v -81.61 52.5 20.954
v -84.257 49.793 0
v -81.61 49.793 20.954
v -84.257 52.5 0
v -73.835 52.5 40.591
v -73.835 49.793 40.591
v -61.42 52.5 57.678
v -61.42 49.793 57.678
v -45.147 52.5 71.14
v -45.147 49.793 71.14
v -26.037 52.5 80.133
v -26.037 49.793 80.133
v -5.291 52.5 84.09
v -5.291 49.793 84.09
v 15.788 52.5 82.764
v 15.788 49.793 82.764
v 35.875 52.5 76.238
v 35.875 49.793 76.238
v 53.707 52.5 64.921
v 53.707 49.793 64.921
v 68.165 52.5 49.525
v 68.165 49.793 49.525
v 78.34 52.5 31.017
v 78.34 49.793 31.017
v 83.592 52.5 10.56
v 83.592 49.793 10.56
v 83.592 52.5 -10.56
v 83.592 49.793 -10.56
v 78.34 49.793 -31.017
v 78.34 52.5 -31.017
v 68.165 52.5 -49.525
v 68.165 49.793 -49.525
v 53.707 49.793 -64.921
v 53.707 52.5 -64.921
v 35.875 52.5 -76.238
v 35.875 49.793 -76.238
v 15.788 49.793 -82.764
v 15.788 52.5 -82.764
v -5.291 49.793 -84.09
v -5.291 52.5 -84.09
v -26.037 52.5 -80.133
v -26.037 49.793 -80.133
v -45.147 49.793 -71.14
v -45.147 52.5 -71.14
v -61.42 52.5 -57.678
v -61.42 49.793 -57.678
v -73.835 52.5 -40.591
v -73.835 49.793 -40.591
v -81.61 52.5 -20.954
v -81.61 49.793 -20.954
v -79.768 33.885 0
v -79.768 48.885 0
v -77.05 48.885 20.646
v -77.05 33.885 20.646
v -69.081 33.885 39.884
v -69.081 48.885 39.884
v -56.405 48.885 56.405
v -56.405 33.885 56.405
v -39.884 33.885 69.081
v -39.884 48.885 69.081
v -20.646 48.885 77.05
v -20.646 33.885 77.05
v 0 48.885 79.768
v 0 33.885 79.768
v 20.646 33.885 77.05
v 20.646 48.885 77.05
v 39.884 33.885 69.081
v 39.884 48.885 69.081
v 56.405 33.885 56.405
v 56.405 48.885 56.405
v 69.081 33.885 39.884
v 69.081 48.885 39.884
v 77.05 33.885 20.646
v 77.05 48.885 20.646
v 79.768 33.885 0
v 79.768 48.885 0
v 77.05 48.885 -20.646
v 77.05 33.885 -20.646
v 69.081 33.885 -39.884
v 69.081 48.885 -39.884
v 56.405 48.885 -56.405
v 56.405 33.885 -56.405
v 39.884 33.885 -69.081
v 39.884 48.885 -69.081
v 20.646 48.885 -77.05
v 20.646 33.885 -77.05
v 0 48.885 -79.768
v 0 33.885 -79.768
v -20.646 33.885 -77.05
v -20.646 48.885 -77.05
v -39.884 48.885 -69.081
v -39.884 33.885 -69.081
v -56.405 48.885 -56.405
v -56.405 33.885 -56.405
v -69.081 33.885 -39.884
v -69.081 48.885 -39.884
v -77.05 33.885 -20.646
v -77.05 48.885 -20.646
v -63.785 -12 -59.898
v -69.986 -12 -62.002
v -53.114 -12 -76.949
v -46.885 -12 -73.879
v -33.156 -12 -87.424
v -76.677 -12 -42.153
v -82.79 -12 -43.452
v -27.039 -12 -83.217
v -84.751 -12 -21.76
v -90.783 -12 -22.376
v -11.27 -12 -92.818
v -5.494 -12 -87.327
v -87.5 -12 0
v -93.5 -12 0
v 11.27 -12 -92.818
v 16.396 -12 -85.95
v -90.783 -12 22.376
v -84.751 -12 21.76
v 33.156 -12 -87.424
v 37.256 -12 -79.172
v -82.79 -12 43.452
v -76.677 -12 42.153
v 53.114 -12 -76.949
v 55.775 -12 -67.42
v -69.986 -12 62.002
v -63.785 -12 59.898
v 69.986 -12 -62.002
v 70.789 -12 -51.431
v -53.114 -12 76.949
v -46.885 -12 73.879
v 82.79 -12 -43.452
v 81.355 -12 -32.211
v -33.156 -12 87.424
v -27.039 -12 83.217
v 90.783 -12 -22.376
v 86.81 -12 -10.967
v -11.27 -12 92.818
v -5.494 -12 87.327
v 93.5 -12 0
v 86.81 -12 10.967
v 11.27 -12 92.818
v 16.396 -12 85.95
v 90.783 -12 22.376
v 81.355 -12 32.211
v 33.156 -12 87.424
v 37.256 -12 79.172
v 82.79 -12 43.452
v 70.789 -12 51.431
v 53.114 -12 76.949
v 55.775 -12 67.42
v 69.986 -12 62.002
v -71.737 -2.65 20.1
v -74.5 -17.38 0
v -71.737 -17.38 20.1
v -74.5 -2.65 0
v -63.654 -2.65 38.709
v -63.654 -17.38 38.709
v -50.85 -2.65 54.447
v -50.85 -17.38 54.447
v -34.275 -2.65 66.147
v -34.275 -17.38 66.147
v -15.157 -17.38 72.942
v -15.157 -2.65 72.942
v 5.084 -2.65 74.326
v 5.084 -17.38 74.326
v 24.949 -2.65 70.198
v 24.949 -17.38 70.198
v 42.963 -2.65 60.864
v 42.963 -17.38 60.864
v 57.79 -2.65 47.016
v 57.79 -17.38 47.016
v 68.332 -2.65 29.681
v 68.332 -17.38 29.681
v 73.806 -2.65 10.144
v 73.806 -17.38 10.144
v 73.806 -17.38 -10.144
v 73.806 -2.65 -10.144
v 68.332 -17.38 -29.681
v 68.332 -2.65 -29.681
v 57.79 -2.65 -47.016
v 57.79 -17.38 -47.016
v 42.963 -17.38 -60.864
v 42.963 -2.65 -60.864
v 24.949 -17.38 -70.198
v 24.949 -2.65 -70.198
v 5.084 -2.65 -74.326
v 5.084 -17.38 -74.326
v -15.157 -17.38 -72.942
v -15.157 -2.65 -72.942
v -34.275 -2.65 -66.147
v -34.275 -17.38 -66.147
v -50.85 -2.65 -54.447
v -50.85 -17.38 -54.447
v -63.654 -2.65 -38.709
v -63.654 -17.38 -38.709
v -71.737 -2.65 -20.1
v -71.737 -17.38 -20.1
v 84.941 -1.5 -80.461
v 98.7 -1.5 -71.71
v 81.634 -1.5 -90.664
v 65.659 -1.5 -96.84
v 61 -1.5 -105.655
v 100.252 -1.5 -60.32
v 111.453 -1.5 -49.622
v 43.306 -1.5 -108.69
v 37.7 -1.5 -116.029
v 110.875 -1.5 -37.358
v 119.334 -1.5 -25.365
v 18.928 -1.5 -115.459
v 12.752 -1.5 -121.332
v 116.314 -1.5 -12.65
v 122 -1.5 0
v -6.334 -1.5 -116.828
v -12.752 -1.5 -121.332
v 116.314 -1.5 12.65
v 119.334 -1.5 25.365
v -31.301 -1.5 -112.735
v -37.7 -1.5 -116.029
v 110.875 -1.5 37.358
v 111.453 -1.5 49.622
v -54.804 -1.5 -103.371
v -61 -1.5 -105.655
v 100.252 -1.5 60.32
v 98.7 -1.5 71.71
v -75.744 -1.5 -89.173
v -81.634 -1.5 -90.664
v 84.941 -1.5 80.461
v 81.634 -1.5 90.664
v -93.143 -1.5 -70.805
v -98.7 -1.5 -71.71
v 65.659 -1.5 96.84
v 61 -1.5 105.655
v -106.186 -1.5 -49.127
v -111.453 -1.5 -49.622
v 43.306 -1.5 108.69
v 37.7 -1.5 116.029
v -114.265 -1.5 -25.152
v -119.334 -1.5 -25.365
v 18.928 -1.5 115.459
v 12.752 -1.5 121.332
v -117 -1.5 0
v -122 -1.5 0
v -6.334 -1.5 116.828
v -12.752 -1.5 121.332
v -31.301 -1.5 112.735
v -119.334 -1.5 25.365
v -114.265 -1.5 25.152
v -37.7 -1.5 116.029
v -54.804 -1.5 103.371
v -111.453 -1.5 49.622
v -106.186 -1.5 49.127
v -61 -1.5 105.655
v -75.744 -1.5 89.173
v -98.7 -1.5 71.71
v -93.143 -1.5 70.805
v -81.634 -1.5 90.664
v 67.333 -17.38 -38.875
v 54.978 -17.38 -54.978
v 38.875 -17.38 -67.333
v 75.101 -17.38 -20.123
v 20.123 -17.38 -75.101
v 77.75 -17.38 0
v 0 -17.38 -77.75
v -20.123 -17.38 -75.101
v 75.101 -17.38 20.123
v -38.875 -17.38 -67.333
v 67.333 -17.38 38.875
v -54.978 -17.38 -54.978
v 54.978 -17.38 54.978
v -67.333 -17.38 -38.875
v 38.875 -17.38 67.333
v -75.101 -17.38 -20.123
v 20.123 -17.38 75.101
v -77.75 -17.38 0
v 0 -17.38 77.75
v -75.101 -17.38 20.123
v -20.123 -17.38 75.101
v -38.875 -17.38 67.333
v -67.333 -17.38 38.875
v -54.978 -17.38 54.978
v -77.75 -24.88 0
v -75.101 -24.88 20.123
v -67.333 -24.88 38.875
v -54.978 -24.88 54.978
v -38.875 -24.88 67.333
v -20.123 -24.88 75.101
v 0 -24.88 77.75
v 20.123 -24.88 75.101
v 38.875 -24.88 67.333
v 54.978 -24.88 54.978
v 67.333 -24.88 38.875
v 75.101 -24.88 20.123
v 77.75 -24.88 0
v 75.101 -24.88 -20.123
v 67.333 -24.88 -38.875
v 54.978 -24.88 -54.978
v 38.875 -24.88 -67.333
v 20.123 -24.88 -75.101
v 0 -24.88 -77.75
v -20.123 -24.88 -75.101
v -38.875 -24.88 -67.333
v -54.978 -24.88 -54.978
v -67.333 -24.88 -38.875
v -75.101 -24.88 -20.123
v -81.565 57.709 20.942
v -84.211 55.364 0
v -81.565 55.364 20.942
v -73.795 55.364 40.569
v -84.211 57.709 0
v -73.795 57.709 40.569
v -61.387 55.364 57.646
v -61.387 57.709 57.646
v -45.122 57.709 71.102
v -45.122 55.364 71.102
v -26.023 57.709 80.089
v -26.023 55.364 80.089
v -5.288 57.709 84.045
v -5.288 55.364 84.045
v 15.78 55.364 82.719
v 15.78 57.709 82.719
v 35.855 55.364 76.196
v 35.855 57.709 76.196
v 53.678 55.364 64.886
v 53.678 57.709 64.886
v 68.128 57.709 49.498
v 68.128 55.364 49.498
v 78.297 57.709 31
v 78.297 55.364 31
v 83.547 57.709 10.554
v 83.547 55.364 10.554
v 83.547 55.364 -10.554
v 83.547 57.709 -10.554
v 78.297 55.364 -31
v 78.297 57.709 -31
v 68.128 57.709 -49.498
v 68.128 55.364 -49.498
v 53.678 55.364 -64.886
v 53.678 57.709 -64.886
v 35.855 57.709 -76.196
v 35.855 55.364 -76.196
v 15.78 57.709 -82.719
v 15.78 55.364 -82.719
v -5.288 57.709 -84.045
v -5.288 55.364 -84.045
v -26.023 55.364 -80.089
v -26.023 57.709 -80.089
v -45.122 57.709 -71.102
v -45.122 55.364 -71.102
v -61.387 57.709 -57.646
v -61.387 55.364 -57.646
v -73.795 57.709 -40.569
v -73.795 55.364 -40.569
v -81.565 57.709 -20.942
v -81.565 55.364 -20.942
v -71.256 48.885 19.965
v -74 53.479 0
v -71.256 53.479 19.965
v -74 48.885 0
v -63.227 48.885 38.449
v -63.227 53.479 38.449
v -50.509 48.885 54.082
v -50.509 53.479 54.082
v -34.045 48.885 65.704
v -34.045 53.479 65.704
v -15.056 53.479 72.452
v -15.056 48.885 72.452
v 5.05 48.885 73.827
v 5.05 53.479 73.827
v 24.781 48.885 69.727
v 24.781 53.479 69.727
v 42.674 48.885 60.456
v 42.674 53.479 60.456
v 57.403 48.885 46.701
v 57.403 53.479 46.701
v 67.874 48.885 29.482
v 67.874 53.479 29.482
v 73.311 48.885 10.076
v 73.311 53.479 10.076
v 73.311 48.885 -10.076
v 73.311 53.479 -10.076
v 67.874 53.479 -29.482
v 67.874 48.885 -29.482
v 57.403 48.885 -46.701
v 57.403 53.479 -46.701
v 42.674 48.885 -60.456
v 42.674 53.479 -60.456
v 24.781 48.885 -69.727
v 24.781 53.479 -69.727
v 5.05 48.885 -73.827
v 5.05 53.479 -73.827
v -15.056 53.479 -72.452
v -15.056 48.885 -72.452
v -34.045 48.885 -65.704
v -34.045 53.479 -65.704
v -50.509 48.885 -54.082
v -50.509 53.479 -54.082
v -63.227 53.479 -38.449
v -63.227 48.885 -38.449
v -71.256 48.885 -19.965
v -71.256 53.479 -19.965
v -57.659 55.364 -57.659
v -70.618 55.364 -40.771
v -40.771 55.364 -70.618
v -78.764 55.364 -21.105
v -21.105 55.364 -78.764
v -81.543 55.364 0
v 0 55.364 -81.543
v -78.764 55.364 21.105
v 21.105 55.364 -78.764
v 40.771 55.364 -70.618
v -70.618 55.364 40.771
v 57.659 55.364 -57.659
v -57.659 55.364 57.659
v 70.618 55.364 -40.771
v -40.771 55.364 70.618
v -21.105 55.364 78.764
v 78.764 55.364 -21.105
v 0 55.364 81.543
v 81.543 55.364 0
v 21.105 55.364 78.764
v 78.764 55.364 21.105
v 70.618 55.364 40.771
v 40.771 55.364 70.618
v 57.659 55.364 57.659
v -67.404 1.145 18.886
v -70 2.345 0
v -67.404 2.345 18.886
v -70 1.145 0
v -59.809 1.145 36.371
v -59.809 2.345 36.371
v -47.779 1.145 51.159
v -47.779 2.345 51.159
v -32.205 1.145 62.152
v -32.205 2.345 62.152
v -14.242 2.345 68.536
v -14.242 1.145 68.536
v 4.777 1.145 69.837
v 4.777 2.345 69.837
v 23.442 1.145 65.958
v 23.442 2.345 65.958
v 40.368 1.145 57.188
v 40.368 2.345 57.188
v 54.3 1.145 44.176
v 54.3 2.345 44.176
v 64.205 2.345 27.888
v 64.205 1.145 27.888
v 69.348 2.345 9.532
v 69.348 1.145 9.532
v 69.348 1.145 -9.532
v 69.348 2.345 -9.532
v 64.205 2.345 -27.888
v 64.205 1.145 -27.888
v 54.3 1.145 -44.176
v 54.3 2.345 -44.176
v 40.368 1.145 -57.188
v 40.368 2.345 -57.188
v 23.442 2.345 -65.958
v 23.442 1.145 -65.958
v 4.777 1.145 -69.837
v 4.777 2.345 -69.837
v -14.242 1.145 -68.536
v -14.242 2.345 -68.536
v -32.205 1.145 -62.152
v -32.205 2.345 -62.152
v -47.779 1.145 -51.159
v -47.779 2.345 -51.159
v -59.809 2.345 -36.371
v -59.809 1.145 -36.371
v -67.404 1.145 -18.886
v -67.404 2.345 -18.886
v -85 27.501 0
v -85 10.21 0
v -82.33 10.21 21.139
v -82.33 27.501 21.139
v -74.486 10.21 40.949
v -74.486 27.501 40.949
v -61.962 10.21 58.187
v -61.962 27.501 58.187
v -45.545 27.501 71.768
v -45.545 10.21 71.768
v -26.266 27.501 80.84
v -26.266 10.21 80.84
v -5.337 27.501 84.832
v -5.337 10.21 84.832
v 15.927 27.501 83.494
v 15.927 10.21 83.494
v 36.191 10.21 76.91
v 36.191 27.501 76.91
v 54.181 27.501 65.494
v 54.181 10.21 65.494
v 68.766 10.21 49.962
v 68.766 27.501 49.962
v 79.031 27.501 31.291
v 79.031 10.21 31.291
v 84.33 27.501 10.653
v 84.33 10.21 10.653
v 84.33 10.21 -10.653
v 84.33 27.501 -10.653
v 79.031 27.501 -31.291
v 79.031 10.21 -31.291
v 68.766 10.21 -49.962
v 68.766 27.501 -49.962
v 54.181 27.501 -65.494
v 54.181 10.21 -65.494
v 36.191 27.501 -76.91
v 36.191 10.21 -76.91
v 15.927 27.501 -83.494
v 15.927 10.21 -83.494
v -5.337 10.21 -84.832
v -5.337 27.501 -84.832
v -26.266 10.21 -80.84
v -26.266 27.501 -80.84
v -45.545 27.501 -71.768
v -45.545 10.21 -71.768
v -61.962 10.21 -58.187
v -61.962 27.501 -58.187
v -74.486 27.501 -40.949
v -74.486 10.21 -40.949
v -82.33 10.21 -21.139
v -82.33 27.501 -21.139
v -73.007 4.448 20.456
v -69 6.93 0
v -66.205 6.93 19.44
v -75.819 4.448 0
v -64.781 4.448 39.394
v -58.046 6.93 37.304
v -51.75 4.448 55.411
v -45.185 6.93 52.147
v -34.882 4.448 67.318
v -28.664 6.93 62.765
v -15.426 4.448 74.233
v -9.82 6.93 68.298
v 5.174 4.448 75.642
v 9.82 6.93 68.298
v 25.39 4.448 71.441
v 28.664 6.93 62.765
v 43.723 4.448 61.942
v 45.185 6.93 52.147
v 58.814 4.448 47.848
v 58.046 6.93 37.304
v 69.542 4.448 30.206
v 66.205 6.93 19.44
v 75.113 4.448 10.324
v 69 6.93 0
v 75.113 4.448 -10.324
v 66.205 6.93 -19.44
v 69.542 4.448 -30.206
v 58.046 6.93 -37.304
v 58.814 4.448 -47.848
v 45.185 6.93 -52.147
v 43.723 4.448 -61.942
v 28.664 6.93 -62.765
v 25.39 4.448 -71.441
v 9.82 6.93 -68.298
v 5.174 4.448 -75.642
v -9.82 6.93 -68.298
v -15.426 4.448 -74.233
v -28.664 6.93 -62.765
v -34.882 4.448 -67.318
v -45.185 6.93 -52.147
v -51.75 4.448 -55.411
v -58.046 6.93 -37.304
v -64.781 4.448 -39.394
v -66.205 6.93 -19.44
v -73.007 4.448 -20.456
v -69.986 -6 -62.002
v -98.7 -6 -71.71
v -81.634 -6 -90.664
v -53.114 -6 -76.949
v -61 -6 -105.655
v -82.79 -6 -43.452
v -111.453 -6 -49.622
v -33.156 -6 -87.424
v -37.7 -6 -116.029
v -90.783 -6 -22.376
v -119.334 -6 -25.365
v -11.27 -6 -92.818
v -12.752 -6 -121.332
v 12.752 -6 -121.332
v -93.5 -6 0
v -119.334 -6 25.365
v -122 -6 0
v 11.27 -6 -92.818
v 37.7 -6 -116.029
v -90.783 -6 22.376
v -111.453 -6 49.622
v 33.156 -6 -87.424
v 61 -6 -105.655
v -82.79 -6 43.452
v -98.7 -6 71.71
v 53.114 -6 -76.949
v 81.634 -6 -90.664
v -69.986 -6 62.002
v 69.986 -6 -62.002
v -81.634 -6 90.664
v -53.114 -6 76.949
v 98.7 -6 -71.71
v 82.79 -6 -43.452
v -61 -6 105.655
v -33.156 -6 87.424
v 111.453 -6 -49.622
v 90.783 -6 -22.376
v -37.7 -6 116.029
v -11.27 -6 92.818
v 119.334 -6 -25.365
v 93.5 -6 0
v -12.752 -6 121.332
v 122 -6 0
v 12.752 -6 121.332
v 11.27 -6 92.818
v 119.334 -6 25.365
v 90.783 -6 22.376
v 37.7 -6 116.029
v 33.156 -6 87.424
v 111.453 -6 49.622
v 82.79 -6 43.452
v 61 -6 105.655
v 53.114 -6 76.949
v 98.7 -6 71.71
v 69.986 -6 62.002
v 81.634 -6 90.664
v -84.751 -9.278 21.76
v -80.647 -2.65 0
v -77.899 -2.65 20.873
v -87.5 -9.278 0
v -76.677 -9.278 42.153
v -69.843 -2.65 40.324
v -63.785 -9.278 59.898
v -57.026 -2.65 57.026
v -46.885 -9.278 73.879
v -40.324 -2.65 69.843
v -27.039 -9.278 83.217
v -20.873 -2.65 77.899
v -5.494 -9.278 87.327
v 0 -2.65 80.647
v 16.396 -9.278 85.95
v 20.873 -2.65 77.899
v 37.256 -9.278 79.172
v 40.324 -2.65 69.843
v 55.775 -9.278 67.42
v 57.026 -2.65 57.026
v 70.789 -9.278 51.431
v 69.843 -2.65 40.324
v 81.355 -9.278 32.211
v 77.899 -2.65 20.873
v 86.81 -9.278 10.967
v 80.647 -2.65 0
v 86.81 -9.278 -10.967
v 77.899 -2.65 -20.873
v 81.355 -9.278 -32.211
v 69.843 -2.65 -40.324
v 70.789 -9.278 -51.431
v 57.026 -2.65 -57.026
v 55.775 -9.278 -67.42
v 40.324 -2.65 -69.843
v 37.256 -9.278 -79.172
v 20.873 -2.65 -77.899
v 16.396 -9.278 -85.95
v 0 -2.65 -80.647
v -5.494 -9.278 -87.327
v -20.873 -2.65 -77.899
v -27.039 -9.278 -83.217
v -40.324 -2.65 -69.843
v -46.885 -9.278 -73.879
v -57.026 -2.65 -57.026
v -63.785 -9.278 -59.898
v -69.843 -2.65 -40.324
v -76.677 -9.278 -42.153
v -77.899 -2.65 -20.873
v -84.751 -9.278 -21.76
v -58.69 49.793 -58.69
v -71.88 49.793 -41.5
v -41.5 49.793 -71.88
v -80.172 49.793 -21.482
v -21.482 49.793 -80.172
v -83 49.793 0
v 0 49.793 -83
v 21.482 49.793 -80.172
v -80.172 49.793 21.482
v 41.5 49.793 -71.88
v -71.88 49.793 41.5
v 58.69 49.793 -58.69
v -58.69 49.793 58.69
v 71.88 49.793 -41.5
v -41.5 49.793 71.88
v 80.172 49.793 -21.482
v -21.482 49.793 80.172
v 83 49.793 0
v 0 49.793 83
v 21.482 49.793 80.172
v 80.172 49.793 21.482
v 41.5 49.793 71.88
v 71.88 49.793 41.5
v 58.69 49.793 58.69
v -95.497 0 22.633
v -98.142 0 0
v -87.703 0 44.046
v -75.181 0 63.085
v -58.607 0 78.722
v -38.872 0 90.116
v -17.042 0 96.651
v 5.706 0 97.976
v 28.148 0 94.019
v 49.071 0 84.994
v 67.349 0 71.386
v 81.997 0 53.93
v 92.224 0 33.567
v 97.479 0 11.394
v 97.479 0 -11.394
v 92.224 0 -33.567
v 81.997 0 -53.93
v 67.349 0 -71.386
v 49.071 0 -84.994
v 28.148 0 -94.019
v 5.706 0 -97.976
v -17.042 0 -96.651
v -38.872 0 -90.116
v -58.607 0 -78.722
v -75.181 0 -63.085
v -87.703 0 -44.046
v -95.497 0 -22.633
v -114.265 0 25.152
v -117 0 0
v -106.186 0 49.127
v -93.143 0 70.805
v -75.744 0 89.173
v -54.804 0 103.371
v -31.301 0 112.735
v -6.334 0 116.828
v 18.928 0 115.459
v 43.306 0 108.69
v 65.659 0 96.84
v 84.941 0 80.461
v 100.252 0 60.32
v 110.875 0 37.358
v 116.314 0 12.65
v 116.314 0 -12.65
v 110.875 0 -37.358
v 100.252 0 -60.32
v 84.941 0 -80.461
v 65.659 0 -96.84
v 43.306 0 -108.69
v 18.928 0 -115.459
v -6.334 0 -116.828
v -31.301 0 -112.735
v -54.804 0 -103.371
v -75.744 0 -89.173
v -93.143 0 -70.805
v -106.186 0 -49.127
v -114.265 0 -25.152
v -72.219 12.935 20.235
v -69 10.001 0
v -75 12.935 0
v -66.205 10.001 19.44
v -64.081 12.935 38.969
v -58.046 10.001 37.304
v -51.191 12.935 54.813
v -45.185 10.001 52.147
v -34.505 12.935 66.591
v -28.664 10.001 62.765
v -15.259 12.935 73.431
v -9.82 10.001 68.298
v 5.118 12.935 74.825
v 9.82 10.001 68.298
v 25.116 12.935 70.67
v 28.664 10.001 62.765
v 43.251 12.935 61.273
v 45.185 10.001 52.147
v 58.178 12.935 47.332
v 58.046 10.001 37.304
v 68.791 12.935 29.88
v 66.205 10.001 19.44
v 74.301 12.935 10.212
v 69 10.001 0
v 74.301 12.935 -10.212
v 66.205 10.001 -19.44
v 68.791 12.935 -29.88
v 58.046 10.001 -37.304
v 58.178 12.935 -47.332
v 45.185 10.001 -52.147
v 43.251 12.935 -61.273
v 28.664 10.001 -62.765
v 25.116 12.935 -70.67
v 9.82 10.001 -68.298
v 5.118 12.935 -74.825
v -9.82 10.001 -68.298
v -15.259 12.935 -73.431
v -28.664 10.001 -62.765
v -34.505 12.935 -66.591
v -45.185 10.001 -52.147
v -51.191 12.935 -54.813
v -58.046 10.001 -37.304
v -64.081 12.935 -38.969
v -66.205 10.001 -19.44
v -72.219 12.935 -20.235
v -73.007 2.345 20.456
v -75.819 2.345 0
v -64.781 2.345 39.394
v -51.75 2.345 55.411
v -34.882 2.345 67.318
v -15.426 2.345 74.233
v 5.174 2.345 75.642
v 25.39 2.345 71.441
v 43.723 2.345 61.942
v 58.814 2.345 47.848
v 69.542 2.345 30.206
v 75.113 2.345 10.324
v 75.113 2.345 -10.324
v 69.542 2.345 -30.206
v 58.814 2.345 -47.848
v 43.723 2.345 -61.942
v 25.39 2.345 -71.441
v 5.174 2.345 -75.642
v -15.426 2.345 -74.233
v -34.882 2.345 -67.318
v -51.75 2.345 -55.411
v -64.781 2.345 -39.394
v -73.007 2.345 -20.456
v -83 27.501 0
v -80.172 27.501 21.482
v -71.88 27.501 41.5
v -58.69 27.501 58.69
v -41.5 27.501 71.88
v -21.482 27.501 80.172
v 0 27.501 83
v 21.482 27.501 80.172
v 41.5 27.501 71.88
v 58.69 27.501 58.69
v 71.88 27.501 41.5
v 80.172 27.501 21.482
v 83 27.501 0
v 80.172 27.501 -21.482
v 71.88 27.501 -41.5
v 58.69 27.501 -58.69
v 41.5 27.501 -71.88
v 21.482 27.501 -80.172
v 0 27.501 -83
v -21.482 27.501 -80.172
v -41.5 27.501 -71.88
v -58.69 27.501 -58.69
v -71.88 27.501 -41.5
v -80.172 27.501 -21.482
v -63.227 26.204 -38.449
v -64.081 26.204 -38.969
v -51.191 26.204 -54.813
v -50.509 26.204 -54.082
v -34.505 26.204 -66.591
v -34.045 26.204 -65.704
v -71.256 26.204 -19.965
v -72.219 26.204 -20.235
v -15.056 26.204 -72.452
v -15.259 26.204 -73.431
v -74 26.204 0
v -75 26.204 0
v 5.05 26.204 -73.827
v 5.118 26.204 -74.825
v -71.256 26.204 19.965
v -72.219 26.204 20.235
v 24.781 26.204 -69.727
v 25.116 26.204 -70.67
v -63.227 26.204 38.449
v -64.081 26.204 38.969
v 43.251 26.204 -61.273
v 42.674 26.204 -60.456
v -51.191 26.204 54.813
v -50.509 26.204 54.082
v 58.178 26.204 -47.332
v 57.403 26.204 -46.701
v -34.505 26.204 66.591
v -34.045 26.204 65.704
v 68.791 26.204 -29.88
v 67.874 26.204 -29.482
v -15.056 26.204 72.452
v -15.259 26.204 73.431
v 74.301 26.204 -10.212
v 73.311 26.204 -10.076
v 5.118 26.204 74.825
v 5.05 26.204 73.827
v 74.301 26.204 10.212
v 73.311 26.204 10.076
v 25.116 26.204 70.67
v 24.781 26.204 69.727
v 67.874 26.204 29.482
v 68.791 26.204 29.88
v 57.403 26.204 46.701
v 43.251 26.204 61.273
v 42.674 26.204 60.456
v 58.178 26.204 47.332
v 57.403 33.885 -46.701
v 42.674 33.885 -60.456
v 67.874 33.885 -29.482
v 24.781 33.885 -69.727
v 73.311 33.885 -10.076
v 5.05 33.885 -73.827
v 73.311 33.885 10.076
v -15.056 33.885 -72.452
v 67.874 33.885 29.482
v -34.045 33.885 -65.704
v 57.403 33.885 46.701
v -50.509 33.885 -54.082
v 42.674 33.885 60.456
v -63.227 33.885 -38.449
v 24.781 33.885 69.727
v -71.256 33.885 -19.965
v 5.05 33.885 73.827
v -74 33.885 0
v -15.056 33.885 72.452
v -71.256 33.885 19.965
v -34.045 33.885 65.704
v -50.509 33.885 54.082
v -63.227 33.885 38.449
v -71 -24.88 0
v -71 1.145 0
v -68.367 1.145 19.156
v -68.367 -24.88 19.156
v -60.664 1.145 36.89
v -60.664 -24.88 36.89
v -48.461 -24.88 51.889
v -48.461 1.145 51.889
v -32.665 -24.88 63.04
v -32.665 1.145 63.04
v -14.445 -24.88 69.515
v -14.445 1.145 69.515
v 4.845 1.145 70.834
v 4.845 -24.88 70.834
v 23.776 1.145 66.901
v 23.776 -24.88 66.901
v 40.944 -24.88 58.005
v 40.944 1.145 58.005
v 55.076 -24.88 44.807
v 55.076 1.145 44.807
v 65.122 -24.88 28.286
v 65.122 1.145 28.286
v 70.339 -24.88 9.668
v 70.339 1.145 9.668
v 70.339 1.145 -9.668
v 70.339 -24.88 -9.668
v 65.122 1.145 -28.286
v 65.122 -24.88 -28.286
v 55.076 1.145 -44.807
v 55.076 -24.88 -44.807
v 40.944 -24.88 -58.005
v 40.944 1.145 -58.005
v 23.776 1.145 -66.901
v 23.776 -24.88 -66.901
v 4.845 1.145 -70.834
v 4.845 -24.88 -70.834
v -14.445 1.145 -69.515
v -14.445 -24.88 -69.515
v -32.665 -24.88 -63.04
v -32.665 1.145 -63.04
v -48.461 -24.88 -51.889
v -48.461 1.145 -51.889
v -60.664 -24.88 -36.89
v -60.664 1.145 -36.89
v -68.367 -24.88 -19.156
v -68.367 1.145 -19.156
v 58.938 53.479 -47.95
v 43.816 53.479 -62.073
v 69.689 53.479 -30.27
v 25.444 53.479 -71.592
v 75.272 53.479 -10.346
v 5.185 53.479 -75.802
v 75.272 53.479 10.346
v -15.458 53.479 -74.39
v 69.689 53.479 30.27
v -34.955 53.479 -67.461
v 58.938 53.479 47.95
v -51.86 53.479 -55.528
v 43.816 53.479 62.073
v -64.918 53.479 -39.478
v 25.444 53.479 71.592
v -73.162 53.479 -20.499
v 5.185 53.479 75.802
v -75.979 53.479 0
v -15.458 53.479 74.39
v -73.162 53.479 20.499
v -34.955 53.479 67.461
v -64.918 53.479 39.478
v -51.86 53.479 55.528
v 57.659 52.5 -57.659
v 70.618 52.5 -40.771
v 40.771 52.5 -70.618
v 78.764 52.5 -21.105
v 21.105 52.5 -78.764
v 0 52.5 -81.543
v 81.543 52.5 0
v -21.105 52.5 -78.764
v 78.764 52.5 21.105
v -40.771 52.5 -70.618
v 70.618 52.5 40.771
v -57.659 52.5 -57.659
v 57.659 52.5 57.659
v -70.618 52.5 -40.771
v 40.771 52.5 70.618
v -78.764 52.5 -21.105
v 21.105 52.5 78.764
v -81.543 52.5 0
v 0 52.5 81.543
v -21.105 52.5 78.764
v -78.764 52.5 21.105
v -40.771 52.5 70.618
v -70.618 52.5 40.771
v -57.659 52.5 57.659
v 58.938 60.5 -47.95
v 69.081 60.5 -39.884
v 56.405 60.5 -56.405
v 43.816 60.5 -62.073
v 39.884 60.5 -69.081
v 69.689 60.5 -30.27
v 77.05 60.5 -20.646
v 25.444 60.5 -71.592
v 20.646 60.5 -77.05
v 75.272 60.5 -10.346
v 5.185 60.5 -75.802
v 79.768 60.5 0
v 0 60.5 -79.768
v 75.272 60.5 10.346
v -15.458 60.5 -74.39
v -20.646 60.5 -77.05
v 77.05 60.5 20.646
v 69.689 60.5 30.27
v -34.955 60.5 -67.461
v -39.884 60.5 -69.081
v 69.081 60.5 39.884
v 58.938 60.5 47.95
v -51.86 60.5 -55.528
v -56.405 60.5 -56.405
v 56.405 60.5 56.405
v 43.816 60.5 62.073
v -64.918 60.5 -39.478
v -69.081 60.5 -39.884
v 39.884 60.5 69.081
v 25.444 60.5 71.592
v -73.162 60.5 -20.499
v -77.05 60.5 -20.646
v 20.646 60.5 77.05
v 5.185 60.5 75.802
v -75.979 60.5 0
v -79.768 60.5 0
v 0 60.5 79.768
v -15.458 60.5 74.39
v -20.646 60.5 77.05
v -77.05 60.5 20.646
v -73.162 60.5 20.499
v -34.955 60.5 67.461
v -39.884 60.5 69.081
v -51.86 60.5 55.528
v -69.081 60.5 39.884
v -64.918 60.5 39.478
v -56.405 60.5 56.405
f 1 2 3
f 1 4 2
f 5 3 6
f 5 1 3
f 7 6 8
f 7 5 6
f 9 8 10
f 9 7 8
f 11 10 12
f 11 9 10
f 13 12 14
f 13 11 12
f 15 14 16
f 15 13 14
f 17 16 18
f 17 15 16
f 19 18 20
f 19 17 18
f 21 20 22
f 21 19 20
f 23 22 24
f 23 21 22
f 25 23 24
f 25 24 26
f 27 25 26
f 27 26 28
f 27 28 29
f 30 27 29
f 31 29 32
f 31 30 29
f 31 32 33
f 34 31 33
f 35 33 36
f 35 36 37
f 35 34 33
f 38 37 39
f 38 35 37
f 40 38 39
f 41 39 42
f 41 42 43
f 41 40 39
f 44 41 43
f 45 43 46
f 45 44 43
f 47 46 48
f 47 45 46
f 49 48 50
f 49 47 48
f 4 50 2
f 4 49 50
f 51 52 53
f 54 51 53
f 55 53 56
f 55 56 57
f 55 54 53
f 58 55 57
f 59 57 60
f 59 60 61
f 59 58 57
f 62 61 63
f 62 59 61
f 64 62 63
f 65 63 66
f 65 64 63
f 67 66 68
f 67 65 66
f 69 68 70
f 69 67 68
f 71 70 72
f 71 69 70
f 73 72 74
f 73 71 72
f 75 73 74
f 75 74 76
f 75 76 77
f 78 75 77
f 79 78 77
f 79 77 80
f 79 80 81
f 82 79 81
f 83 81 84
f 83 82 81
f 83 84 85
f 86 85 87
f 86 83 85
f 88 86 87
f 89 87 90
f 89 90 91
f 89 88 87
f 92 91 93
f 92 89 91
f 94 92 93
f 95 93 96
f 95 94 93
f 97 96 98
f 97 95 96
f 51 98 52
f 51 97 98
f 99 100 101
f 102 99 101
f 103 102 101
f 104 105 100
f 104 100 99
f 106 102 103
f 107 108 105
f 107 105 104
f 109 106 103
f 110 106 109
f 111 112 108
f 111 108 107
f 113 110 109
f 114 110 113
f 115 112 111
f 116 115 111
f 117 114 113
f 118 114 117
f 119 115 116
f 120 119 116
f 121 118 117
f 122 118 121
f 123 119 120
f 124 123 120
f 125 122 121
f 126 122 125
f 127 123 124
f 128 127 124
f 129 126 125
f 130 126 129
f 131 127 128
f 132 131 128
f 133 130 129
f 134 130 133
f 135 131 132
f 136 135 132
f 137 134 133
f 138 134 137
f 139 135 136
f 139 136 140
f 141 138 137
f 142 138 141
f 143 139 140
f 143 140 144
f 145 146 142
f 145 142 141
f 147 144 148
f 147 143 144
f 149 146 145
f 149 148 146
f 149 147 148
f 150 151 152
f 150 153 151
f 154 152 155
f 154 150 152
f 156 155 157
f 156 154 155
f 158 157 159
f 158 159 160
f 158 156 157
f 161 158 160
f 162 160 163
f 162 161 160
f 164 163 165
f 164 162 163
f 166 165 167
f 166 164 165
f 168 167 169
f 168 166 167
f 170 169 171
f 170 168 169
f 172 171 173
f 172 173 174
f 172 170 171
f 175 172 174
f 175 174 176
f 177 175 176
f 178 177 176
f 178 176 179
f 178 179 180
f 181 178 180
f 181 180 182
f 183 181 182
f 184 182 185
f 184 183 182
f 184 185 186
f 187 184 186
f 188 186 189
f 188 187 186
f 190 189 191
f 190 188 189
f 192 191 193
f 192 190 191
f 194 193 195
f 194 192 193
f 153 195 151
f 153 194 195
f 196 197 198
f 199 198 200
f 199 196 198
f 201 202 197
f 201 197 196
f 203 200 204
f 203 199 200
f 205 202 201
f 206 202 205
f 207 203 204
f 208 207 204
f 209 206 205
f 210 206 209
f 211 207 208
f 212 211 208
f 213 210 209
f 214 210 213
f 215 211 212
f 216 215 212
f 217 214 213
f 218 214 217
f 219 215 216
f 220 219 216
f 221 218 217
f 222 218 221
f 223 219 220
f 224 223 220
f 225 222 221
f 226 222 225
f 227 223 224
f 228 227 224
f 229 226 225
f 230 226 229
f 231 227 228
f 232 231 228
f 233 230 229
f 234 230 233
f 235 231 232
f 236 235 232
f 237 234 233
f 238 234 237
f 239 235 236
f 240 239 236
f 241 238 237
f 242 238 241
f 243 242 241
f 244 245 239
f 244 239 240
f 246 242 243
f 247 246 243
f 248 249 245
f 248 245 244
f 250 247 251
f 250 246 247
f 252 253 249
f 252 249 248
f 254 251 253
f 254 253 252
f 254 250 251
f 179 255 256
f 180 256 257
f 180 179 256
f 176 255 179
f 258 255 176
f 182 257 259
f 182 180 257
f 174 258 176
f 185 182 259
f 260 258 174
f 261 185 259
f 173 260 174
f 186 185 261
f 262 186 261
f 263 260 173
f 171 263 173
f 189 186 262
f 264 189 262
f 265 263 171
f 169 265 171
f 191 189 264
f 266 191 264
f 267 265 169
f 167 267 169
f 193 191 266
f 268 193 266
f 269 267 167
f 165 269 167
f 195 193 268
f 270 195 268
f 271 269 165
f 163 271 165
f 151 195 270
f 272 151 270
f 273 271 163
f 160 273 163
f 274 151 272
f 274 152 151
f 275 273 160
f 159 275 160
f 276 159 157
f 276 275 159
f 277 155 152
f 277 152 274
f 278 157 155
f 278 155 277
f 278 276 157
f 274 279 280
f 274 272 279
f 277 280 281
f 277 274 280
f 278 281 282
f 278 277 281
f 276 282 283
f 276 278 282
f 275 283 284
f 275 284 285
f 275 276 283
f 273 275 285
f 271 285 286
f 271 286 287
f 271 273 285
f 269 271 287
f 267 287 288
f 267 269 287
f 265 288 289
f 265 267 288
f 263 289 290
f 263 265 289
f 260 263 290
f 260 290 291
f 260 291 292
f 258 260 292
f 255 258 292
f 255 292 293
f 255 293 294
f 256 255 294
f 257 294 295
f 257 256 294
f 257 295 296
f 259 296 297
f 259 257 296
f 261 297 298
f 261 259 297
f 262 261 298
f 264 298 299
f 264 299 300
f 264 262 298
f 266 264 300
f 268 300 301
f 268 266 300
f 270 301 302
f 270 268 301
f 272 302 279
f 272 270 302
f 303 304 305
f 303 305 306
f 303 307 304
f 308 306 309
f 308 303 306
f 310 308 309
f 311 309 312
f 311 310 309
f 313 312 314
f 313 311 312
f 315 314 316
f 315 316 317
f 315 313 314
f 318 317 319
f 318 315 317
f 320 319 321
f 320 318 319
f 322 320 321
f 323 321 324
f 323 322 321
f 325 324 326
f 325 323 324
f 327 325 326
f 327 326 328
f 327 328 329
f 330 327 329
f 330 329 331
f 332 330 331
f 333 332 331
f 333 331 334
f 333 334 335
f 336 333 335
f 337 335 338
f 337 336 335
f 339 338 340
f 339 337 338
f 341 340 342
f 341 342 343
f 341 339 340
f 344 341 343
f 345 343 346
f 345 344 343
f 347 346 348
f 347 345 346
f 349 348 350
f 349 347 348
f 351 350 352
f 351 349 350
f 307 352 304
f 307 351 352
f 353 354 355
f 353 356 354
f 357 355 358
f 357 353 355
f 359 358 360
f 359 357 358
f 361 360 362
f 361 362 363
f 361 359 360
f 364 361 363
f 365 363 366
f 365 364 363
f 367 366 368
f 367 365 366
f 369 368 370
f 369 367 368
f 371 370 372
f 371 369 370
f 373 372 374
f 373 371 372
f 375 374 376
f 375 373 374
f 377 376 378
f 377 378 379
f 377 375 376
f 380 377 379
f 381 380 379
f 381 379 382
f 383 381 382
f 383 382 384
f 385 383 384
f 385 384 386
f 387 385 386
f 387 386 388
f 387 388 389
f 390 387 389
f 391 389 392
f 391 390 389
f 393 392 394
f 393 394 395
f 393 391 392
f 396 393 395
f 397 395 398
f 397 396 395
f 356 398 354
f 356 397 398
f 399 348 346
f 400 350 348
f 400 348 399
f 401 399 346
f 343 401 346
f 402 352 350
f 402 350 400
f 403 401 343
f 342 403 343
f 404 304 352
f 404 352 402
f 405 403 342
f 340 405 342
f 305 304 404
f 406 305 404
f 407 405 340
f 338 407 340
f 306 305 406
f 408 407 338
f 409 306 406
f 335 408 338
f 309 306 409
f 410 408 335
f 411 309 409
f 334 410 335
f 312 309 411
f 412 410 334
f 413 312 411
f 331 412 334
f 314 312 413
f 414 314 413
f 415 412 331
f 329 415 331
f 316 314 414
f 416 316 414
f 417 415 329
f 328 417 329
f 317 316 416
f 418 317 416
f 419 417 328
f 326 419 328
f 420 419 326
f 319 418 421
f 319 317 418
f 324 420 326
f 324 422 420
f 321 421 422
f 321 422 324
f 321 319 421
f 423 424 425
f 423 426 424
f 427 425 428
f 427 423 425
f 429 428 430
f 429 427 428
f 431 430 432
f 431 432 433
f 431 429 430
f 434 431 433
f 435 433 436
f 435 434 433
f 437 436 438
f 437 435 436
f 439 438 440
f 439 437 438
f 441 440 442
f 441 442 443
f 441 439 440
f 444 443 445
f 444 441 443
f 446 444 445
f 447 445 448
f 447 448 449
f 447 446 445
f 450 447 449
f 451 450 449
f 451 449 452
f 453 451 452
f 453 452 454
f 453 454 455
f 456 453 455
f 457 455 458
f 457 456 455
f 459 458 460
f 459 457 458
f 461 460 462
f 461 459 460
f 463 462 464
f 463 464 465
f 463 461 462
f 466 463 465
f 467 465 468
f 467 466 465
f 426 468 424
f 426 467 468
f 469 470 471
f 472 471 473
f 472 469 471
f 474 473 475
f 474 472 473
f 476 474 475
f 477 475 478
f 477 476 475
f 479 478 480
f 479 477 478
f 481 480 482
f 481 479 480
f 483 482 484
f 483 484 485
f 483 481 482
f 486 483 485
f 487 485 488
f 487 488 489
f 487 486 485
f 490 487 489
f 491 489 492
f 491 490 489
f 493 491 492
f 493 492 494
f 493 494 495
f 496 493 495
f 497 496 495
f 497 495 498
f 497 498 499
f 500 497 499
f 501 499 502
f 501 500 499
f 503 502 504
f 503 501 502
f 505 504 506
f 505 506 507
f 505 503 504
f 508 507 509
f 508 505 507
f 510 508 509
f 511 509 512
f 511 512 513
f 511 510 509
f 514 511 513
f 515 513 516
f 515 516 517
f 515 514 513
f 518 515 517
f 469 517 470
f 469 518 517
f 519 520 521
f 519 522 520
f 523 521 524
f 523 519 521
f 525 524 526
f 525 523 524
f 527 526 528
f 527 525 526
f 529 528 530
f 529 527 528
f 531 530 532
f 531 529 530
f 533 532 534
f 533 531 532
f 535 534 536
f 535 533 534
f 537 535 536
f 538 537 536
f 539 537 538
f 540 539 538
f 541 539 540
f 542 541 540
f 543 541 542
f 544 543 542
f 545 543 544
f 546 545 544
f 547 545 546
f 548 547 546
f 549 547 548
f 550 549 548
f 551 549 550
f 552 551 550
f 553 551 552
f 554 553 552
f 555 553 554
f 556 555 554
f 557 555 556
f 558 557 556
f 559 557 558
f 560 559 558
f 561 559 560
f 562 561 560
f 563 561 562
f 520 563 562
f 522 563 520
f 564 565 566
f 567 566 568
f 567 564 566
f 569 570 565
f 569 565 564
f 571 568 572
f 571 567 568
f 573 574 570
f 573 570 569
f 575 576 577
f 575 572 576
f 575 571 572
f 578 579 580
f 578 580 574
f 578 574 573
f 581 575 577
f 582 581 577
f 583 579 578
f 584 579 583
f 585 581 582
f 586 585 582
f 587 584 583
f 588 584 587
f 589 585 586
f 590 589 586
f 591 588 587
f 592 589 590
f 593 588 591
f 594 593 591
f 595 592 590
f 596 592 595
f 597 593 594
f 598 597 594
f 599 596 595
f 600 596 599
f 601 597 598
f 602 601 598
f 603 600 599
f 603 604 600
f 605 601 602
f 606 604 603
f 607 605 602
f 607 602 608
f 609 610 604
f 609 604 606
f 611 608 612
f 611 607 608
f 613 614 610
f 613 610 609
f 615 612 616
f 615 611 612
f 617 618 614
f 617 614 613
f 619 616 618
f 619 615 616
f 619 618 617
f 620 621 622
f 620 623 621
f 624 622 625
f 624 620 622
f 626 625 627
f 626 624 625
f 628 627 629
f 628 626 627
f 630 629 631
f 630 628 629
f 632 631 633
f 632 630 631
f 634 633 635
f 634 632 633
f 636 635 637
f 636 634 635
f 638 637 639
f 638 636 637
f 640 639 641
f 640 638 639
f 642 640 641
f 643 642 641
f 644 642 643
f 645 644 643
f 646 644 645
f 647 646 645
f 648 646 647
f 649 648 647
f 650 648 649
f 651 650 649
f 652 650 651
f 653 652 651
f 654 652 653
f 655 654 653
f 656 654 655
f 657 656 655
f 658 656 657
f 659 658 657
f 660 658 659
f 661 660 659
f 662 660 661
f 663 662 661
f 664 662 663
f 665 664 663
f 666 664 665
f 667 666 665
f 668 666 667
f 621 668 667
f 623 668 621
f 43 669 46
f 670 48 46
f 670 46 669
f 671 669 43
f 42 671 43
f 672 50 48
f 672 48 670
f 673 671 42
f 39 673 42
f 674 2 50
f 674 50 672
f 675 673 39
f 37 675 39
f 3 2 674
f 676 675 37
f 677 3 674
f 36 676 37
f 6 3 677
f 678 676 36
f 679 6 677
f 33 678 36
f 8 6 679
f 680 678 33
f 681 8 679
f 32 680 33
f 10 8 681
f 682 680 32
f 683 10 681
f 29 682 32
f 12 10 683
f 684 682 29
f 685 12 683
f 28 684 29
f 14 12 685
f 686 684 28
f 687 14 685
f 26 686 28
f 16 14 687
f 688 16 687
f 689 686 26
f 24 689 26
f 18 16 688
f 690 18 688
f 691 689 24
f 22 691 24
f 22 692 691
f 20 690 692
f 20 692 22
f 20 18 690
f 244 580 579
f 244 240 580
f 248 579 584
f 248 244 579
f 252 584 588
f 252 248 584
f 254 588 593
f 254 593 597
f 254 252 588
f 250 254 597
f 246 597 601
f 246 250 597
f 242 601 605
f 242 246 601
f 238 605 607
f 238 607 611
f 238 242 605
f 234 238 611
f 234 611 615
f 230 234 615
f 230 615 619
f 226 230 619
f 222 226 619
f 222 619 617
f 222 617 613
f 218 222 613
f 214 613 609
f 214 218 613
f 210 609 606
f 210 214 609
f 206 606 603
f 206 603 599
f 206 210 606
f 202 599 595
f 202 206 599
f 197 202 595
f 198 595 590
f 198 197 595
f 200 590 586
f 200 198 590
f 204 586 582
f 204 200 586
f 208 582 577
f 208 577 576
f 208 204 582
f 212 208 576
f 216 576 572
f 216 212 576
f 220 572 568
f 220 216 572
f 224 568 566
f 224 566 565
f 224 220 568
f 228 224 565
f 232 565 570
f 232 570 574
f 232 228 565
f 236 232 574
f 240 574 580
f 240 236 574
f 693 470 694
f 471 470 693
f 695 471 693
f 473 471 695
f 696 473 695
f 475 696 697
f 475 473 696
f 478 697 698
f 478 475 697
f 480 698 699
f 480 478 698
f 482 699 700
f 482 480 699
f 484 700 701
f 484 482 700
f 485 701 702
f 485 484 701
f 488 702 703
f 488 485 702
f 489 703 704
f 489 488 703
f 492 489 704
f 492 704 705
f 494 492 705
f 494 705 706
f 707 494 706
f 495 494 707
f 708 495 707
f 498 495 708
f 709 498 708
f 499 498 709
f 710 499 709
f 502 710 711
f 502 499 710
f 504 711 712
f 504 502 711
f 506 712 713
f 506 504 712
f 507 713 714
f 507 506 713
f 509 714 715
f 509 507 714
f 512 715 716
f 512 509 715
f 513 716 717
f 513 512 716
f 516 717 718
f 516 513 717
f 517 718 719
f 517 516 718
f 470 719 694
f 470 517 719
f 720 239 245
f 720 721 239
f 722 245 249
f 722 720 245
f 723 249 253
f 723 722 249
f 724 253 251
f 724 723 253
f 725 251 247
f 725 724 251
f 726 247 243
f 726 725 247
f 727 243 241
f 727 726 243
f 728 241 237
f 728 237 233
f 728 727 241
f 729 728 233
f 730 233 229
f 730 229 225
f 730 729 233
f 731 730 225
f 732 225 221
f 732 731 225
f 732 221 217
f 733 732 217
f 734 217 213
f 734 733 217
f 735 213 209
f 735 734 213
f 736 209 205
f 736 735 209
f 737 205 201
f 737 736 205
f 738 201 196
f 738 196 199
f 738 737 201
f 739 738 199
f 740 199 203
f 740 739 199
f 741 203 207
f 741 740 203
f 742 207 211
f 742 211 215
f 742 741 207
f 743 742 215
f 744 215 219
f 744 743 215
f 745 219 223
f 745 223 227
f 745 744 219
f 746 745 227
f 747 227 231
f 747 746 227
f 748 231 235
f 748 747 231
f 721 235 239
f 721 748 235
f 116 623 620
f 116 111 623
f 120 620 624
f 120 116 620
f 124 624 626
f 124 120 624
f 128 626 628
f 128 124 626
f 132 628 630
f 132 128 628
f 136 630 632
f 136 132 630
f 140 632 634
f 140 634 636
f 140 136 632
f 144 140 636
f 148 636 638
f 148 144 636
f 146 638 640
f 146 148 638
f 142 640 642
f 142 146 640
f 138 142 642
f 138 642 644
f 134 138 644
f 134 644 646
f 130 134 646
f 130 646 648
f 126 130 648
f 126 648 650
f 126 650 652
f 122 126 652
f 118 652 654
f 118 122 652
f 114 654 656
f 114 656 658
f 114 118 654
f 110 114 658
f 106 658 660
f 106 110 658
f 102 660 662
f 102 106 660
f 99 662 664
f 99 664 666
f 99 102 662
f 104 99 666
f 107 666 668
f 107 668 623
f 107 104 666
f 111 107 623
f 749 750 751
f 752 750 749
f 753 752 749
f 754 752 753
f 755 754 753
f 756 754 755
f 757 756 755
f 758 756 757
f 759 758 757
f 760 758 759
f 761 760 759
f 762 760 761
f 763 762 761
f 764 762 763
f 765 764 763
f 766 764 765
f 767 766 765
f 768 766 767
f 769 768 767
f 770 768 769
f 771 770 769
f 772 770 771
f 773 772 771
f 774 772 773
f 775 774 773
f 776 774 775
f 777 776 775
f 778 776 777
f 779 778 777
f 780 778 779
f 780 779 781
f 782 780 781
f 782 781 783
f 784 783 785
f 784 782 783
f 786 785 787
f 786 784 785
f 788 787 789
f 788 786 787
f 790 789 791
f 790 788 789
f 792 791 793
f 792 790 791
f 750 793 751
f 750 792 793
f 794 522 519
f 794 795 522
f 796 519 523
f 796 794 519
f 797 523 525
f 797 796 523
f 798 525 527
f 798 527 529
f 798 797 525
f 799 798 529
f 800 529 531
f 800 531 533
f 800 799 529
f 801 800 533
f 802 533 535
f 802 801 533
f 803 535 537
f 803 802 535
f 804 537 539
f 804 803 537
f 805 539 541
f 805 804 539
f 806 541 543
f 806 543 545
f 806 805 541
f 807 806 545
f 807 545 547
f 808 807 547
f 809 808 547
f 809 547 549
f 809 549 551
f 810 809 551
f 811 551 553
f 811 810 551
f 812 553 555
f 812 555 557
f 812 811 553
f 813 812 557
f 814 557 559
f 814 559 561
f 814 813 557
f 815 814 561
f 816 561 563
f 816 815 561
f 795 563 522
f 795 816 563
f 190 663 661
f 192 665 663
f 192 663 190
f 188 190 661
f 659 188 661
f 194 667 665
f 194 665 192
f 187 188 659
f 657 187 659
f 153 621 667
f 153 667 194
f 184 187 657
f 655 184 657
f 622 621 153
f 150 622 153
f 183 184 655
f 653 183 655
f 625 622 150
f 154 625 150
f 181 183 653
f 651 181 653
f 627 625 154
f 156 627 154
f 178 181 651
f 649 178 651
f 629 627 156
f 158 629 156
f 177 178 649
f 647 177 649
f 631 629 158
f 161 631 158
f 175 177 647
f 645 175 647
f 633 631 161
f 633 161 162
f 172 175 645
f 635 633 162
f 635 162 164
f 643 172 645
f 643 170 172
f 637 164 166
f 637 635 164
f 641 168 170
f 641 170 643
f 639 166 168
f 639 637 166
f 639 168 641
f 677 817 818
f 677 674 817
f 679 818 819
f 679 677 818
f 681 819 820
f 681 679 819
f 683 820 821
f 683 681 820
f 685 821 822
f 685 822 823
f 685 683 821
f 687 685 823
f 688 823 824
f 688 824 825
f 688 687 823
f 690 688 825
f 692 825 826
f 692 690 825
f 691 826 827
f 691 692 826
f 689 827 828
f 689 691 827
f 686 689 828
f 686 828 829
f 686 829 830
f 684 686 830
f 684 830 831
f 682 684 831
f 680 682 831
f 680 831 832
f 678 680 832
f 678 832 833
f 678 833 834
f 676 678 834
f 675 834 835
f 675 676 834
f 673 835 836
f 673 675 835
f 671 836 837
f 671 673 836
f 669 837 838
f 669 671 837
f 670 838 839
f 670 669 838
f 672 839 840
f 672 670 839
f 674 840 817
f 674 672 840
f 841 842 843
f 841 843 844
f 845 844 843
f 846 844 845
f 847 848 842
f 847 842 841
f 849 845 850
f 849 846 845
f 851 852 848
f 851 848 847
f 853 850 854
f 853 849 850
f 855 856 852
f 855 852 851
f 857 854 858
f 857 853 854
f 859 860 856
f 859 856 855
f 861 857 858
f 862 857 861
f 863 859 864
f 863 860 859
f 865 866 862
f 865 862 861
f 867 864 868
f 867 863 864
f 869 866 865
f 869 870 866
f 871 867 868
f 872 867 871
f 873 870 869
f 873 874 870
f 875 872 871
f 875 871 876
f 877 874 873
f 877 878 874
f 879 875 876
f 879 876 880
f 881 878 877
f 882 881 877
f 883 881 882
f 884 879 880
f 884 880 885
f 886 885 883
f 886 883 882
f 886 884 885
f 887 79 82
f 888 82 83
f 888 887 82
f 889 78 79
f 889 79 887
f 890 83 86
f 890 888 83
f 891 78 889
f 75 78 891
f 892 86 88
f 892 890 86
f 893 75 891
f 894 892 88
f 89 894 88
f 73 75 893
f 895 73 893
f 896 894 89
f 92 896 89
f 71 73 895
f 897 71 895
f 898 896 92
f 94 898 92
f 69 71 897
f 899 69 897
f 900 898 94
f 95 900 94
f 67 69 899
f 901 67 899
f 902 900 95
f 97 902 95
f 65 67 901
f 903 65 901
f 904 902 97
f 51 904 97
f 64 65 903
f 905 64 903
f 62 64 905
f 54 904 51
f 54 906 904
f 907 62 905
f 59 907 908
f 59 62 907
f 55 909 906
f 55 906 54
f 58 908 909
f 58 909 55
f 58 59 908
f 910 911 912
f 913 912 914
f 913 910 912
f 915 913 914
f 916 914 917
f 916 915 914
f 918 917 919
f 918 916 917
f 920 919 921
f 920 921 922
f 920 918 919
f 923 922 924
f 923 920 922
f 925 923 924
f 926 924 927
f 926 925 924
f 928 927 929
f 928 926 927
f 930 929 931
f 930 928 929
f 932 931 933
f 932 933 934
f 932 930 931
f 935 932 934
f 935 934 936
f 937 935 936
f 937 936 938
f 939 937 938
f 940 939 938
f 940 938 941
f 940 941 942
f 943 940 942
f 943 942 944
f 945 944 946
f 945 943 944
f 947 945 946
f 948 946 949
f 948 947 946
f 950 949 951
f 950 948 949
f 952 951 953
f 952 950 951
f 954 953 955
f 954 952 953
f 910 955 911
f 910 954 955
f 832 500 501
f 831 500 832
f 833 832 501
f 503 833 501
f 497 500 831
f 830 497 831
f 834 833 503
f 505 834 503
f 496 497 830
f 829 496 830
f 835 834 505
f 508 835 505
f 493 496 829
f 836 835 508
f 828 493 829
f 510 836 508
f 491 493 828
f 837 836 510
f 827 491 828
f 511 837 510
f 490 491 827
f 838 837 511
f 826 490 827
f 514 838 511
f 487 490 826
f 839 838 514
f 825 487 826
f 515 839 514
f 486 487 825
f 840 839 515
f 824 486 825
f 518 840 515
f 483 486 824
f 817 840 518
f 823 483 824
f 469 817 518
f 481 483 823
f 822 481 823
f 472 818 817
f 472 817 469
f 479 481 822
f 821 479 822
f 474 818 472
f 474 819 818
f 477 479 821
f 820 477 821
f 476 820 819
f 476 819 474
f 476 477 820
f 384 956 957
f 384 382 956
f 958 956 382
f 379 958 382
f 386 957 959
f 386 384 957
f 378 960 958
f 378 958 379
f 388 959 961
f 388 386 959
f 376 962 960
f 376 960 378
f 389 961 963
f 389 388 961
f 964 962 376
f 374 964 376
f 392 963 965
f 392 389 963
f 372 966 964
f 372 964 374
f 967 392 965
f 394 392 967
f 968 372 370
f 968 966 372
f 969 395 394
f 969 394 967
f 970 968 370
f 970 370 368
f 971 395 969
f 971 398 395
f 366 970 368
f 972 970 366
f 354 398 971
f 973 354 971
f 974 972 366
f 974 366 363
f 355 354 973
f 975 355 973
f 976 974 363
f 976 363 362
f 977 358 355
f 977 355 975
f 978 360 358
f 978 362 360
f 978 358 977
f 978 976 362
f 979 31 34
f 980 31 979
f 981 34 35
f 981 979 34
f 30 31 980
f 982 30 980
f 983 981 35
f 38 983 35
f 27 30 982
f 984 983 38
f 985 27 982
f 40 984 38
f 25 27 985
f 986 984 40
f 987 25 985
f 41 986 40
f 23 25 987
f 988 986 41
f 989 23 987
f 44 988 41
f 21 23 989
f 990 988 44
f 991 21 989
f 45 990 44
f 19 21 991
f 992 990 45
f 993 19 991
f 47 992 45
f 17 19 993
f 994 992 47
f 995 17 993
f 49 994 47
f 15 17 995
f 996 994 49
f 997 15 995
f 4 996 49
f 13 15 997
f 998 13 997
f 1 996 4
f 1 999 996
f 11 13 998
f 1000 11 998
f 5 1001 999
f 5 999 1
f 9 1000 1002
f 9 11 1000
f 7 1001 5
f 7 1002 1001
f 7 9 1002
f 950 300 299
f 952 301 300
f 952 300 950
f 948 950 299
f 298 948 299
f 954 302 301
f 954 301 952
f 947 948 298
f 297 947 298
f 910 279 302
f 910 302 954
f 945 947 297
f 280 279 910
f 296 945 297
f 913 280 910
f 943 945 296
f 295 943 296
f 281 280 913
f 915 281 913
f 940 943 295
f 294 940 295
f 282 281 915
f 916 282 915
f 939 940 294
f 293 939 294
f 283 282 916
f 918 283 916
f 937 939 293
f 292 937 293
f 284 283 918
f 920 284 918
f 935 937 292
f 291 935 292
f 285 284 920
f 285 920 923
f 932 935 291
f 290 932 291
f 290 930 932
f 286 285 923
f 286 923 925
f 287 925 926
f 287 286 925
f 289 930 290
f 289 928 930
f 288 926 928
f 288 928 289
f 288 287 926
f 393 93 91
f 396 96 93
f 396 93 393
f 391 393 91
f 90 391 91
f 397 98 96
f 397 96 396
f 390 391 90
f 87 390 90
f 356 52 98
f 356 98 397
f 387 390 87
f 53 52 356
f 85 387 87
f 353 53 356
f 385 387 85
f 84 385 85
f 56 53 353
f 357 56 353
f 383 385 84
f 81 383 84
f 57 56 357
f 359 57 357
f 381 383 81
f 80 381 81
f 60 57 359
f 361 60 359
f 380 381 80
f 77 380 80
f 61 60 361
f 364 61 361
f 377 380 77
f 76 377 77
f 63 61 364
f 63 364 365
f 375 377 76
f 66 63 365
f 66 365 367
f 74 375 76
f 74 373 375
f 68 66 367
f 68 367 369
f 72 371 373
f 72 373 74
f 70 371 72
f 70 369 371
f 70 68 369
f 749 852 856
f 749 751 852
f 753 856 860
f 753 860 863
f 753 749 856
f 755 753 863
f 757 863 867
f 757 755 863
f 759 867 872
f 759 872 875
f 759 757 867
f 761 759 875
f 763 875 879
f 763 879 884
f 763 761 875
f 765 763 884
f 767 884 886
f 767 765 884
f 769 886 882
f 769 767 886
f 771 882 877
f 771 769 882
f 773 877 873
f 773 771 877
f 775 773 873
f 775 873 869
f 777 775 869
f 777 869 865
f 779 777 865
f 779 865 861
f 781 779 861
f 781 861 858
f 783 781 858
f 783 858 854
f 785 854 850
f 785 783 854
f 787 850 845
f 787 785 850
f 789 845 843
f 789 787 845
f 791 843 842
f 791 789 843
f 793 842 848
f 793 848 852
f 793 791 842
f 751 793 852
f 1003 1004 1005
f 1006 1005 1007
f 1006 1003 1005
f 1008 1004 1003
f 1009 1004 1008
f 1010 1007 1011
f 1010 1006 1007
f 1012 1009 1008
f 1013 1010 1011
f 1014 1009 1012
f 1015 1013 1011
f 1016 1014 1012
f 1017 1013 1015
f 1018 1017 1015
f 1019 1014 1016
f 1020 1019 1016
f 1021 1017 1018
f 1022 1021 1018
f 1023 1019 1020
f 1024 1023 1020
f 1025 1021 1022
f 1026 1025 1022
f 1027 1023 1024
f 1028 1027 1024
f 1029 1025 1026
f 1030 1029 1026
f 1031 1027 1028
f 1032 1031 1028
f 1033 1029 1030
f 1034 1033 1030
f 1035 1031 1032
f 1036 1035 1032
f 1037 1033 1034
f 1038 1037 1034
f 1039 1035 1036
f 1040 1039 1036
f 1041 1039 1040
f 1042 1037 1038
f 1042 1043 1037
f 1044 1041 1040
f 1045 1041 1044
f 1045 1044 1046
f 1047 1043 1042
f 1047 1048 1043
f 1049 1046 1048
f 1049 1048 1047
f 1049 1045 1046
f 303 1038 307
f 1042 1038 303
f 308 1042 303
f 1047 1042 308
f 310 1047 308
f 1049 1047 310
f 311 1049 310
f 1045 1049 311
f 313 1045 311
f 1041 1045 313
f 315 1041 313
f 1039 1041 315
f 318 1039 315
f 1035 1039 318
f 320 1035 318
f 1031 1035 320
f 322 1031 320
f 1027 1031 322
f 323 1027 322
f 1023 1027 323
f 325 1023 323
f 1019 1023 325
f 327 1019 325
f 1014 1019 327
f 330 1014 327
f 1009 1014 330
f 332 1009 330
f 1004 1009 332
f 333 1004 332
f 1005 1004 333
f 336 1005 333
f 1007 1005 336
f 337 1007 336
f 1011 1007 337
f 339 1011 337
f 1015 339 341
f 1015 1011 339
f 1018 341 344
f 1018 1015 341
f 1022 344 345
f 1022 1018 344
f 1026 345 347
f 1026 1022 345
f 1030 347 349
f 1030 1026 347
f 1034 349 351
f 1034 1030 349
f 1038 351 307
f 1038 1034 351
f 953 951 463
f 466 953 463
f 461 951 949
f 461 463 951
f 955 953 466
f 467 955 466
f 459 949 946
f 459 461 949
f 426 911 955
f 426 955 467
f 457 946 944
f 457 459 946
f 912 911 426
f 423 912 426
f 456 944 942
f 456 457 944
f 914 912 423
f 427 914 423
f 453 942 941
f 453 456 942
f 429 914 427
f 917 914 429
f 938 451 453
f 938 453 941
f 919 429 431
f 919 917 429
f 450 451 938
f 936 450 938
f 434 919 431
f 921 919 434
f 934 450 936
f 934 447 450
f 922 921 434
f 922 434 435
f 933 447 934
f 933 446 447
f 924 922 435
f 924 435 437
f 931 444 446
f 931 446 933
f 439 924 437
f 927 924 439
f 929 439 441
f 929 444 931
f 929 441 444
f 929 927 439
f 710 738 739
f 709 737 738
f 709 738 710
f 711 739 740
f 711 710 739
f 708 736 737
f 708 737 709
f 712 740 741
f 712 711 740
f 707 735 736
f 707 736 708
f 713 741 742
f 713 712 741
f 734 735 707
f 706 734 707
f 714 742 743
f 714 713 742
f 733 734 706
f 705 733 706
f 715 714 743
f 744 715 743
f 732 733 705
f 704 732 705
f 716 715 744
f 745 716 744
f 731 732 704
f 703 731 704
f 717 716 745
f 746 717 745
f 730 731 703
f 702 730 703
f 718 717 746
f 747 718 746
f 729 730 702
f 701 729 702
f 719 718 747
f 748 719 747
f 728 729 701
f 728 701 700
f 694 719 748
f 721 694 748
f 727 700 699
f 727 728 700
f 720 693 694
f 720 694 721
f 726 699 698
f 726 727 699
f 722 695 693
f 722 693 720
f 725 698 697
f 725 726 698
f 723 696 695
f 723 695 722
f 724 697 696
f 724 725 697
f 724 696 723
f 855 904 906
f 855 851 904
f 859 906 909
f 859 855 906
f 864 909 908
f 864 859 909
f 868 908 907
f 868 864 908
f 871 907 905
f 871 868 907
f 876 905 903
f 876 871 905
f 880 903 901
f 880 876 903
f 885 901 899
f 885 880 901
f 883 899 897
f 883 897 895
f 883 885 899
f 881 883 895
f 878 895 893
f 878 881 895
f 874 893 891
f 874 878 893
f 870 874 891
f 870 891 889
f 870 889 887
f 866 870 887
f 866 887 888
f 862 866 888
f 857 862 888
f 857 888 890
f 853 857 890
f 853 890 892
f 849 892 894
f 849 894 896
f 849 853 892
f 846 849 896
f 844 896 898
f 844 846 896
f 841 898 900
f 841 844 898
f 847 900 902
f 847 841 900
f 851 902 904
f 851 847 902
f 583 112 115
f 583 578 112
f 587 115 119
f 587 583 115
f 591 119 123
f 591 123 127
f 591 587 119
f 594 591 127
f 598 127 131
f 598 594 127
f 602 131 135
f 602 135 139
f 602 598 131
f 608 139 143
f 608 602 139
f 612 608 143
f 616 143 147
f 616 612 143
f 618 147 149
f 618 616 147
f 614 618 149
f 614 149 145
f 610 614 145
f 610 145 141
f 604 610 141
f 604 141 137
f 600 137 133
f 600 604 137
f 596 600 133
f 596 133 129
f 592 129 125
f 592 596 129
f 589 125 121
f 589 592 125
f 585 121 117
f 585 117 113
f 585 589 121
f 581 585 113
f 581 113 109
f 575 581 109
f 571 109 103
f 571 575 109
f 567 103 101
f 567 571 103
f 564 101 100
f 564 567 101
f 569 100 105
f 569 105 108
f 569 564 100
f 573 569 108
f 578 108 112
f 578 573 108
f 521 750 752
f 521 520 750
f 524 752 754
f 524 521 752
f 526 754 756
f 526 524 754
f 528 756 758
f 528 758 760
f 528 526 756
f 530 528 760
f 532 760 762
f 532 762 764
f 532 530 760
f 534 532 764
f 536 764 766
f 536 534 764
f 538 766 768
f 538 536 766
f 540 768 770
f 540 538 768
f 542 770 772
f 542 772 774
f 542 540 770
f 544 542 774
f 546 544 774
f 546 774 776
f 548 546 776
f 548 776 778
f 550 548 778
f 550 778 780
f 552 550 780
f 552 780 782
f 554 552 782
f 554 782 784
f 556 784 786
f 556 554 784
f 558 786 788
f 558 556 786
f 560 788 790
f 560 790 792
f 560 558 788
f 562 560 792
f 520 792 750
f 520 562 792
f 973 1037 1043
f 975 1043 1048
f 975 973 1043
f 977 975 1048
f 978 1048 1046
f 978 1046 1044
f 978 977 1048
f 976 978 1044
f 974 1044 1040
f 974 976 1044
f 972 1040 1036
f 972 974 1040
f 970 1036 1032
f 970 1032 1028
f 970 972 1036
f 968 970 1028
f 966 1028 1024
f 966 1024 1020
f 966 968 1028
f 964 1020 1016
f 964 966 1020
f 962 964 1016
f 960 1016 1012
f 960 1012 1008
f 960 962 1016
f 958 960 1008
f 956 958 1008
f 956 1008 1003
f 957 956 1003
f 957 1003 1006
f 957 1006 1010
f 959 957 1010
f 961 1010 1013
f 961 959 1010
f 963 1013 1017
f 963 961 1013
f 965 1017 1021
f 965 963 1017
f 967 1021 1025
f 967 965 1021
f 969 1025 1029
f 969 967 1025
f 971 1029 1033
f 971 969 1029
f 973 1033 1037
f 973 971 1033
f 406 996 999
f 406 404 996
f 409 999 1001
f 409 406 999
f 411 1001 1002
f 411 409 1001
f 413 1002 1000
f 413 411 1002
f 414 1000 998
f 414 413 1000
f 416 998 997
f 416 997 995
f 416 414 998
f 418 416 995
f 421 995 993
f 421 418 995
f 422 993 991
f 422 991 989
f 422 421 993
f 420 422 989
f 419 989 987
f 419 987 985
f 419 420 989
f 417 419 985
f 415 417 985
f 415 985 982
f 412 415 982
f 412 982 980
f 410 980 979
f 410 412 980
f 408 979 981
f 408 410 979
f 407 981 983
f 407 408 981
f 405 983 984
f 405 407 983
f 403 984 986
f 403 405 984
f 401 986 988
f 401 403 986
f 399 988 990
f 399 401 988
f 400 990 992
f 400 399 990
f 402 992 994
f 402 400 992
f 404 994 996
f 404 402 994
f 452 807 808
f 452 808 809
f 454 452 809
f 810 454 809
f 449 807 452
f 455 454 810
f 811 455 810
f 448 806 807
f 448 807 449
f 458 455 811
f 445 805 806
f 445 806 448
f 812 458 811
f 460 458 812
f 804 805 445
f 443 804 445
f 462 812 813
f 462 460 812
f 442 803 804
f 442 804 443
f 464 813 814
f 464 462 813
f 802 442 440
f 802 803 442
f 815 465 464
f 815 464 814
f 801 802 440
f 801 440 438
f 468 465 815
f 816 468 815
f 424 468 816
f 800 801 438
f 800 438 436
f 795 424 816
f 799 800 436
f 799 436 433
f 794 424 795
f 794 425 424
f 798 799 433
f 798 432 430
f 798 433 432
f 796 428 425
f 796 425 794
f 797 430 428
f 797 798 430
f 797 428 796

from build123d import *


with BuildPart() as part:
    # Sketch2 → Revolve1 (revolve)
    with BuildSketch(Plane.XY):
        Polygon((-117, 0), (-98.142287974, 0), (-85, 10.210436502), (-85, 27.501263708), (-83, 27.501263708), (-83, 49.793455931), (-84.256609276, 49.793455931), (-84.256609276, 52.5), (-81.542630117, 52.5), (-81.542630117, 55.363879954), (-84.210889447, 55.363879954), (-84.210889447, 57.708994813), (-79.768205673, 60.5), (-75.979278114, 60.5), (-75.979278114, 53.479264493), (-74, 53.479264493), (-74, 48.88455903), (-79.768205673, 48.88455903), (-79.768205673, 33.88455903), (-74, 33.88455903), (-74, 26.204482528), (-75, 26.204482528), (-75, 12.93545297), (-69, 10.000926501), (-69, 6.929678014), (-75.818813089, 4.447833016), (-75.818813089, 2.344727047), (-70, 2.344727047), (-70, 1.144727047), (-71, 1.144727047), (-71, -24.879740451), (-77.75, -24.879740451), (-77.75, -17.379740451), (-74.5, -17.379740451), (-74.5, -2.65), (-80.647227673, -2.65), (-87.5, -9.277608288), (-87.5, -12), (-93.5, -12), (-93.5, -6), (-122, -6), (-122, -1.5), (-117, -1.5), align=None)
    revolve(axis=Axis((0, -27.768010488, 0), (0, 1, 0)))


solid = part.part
